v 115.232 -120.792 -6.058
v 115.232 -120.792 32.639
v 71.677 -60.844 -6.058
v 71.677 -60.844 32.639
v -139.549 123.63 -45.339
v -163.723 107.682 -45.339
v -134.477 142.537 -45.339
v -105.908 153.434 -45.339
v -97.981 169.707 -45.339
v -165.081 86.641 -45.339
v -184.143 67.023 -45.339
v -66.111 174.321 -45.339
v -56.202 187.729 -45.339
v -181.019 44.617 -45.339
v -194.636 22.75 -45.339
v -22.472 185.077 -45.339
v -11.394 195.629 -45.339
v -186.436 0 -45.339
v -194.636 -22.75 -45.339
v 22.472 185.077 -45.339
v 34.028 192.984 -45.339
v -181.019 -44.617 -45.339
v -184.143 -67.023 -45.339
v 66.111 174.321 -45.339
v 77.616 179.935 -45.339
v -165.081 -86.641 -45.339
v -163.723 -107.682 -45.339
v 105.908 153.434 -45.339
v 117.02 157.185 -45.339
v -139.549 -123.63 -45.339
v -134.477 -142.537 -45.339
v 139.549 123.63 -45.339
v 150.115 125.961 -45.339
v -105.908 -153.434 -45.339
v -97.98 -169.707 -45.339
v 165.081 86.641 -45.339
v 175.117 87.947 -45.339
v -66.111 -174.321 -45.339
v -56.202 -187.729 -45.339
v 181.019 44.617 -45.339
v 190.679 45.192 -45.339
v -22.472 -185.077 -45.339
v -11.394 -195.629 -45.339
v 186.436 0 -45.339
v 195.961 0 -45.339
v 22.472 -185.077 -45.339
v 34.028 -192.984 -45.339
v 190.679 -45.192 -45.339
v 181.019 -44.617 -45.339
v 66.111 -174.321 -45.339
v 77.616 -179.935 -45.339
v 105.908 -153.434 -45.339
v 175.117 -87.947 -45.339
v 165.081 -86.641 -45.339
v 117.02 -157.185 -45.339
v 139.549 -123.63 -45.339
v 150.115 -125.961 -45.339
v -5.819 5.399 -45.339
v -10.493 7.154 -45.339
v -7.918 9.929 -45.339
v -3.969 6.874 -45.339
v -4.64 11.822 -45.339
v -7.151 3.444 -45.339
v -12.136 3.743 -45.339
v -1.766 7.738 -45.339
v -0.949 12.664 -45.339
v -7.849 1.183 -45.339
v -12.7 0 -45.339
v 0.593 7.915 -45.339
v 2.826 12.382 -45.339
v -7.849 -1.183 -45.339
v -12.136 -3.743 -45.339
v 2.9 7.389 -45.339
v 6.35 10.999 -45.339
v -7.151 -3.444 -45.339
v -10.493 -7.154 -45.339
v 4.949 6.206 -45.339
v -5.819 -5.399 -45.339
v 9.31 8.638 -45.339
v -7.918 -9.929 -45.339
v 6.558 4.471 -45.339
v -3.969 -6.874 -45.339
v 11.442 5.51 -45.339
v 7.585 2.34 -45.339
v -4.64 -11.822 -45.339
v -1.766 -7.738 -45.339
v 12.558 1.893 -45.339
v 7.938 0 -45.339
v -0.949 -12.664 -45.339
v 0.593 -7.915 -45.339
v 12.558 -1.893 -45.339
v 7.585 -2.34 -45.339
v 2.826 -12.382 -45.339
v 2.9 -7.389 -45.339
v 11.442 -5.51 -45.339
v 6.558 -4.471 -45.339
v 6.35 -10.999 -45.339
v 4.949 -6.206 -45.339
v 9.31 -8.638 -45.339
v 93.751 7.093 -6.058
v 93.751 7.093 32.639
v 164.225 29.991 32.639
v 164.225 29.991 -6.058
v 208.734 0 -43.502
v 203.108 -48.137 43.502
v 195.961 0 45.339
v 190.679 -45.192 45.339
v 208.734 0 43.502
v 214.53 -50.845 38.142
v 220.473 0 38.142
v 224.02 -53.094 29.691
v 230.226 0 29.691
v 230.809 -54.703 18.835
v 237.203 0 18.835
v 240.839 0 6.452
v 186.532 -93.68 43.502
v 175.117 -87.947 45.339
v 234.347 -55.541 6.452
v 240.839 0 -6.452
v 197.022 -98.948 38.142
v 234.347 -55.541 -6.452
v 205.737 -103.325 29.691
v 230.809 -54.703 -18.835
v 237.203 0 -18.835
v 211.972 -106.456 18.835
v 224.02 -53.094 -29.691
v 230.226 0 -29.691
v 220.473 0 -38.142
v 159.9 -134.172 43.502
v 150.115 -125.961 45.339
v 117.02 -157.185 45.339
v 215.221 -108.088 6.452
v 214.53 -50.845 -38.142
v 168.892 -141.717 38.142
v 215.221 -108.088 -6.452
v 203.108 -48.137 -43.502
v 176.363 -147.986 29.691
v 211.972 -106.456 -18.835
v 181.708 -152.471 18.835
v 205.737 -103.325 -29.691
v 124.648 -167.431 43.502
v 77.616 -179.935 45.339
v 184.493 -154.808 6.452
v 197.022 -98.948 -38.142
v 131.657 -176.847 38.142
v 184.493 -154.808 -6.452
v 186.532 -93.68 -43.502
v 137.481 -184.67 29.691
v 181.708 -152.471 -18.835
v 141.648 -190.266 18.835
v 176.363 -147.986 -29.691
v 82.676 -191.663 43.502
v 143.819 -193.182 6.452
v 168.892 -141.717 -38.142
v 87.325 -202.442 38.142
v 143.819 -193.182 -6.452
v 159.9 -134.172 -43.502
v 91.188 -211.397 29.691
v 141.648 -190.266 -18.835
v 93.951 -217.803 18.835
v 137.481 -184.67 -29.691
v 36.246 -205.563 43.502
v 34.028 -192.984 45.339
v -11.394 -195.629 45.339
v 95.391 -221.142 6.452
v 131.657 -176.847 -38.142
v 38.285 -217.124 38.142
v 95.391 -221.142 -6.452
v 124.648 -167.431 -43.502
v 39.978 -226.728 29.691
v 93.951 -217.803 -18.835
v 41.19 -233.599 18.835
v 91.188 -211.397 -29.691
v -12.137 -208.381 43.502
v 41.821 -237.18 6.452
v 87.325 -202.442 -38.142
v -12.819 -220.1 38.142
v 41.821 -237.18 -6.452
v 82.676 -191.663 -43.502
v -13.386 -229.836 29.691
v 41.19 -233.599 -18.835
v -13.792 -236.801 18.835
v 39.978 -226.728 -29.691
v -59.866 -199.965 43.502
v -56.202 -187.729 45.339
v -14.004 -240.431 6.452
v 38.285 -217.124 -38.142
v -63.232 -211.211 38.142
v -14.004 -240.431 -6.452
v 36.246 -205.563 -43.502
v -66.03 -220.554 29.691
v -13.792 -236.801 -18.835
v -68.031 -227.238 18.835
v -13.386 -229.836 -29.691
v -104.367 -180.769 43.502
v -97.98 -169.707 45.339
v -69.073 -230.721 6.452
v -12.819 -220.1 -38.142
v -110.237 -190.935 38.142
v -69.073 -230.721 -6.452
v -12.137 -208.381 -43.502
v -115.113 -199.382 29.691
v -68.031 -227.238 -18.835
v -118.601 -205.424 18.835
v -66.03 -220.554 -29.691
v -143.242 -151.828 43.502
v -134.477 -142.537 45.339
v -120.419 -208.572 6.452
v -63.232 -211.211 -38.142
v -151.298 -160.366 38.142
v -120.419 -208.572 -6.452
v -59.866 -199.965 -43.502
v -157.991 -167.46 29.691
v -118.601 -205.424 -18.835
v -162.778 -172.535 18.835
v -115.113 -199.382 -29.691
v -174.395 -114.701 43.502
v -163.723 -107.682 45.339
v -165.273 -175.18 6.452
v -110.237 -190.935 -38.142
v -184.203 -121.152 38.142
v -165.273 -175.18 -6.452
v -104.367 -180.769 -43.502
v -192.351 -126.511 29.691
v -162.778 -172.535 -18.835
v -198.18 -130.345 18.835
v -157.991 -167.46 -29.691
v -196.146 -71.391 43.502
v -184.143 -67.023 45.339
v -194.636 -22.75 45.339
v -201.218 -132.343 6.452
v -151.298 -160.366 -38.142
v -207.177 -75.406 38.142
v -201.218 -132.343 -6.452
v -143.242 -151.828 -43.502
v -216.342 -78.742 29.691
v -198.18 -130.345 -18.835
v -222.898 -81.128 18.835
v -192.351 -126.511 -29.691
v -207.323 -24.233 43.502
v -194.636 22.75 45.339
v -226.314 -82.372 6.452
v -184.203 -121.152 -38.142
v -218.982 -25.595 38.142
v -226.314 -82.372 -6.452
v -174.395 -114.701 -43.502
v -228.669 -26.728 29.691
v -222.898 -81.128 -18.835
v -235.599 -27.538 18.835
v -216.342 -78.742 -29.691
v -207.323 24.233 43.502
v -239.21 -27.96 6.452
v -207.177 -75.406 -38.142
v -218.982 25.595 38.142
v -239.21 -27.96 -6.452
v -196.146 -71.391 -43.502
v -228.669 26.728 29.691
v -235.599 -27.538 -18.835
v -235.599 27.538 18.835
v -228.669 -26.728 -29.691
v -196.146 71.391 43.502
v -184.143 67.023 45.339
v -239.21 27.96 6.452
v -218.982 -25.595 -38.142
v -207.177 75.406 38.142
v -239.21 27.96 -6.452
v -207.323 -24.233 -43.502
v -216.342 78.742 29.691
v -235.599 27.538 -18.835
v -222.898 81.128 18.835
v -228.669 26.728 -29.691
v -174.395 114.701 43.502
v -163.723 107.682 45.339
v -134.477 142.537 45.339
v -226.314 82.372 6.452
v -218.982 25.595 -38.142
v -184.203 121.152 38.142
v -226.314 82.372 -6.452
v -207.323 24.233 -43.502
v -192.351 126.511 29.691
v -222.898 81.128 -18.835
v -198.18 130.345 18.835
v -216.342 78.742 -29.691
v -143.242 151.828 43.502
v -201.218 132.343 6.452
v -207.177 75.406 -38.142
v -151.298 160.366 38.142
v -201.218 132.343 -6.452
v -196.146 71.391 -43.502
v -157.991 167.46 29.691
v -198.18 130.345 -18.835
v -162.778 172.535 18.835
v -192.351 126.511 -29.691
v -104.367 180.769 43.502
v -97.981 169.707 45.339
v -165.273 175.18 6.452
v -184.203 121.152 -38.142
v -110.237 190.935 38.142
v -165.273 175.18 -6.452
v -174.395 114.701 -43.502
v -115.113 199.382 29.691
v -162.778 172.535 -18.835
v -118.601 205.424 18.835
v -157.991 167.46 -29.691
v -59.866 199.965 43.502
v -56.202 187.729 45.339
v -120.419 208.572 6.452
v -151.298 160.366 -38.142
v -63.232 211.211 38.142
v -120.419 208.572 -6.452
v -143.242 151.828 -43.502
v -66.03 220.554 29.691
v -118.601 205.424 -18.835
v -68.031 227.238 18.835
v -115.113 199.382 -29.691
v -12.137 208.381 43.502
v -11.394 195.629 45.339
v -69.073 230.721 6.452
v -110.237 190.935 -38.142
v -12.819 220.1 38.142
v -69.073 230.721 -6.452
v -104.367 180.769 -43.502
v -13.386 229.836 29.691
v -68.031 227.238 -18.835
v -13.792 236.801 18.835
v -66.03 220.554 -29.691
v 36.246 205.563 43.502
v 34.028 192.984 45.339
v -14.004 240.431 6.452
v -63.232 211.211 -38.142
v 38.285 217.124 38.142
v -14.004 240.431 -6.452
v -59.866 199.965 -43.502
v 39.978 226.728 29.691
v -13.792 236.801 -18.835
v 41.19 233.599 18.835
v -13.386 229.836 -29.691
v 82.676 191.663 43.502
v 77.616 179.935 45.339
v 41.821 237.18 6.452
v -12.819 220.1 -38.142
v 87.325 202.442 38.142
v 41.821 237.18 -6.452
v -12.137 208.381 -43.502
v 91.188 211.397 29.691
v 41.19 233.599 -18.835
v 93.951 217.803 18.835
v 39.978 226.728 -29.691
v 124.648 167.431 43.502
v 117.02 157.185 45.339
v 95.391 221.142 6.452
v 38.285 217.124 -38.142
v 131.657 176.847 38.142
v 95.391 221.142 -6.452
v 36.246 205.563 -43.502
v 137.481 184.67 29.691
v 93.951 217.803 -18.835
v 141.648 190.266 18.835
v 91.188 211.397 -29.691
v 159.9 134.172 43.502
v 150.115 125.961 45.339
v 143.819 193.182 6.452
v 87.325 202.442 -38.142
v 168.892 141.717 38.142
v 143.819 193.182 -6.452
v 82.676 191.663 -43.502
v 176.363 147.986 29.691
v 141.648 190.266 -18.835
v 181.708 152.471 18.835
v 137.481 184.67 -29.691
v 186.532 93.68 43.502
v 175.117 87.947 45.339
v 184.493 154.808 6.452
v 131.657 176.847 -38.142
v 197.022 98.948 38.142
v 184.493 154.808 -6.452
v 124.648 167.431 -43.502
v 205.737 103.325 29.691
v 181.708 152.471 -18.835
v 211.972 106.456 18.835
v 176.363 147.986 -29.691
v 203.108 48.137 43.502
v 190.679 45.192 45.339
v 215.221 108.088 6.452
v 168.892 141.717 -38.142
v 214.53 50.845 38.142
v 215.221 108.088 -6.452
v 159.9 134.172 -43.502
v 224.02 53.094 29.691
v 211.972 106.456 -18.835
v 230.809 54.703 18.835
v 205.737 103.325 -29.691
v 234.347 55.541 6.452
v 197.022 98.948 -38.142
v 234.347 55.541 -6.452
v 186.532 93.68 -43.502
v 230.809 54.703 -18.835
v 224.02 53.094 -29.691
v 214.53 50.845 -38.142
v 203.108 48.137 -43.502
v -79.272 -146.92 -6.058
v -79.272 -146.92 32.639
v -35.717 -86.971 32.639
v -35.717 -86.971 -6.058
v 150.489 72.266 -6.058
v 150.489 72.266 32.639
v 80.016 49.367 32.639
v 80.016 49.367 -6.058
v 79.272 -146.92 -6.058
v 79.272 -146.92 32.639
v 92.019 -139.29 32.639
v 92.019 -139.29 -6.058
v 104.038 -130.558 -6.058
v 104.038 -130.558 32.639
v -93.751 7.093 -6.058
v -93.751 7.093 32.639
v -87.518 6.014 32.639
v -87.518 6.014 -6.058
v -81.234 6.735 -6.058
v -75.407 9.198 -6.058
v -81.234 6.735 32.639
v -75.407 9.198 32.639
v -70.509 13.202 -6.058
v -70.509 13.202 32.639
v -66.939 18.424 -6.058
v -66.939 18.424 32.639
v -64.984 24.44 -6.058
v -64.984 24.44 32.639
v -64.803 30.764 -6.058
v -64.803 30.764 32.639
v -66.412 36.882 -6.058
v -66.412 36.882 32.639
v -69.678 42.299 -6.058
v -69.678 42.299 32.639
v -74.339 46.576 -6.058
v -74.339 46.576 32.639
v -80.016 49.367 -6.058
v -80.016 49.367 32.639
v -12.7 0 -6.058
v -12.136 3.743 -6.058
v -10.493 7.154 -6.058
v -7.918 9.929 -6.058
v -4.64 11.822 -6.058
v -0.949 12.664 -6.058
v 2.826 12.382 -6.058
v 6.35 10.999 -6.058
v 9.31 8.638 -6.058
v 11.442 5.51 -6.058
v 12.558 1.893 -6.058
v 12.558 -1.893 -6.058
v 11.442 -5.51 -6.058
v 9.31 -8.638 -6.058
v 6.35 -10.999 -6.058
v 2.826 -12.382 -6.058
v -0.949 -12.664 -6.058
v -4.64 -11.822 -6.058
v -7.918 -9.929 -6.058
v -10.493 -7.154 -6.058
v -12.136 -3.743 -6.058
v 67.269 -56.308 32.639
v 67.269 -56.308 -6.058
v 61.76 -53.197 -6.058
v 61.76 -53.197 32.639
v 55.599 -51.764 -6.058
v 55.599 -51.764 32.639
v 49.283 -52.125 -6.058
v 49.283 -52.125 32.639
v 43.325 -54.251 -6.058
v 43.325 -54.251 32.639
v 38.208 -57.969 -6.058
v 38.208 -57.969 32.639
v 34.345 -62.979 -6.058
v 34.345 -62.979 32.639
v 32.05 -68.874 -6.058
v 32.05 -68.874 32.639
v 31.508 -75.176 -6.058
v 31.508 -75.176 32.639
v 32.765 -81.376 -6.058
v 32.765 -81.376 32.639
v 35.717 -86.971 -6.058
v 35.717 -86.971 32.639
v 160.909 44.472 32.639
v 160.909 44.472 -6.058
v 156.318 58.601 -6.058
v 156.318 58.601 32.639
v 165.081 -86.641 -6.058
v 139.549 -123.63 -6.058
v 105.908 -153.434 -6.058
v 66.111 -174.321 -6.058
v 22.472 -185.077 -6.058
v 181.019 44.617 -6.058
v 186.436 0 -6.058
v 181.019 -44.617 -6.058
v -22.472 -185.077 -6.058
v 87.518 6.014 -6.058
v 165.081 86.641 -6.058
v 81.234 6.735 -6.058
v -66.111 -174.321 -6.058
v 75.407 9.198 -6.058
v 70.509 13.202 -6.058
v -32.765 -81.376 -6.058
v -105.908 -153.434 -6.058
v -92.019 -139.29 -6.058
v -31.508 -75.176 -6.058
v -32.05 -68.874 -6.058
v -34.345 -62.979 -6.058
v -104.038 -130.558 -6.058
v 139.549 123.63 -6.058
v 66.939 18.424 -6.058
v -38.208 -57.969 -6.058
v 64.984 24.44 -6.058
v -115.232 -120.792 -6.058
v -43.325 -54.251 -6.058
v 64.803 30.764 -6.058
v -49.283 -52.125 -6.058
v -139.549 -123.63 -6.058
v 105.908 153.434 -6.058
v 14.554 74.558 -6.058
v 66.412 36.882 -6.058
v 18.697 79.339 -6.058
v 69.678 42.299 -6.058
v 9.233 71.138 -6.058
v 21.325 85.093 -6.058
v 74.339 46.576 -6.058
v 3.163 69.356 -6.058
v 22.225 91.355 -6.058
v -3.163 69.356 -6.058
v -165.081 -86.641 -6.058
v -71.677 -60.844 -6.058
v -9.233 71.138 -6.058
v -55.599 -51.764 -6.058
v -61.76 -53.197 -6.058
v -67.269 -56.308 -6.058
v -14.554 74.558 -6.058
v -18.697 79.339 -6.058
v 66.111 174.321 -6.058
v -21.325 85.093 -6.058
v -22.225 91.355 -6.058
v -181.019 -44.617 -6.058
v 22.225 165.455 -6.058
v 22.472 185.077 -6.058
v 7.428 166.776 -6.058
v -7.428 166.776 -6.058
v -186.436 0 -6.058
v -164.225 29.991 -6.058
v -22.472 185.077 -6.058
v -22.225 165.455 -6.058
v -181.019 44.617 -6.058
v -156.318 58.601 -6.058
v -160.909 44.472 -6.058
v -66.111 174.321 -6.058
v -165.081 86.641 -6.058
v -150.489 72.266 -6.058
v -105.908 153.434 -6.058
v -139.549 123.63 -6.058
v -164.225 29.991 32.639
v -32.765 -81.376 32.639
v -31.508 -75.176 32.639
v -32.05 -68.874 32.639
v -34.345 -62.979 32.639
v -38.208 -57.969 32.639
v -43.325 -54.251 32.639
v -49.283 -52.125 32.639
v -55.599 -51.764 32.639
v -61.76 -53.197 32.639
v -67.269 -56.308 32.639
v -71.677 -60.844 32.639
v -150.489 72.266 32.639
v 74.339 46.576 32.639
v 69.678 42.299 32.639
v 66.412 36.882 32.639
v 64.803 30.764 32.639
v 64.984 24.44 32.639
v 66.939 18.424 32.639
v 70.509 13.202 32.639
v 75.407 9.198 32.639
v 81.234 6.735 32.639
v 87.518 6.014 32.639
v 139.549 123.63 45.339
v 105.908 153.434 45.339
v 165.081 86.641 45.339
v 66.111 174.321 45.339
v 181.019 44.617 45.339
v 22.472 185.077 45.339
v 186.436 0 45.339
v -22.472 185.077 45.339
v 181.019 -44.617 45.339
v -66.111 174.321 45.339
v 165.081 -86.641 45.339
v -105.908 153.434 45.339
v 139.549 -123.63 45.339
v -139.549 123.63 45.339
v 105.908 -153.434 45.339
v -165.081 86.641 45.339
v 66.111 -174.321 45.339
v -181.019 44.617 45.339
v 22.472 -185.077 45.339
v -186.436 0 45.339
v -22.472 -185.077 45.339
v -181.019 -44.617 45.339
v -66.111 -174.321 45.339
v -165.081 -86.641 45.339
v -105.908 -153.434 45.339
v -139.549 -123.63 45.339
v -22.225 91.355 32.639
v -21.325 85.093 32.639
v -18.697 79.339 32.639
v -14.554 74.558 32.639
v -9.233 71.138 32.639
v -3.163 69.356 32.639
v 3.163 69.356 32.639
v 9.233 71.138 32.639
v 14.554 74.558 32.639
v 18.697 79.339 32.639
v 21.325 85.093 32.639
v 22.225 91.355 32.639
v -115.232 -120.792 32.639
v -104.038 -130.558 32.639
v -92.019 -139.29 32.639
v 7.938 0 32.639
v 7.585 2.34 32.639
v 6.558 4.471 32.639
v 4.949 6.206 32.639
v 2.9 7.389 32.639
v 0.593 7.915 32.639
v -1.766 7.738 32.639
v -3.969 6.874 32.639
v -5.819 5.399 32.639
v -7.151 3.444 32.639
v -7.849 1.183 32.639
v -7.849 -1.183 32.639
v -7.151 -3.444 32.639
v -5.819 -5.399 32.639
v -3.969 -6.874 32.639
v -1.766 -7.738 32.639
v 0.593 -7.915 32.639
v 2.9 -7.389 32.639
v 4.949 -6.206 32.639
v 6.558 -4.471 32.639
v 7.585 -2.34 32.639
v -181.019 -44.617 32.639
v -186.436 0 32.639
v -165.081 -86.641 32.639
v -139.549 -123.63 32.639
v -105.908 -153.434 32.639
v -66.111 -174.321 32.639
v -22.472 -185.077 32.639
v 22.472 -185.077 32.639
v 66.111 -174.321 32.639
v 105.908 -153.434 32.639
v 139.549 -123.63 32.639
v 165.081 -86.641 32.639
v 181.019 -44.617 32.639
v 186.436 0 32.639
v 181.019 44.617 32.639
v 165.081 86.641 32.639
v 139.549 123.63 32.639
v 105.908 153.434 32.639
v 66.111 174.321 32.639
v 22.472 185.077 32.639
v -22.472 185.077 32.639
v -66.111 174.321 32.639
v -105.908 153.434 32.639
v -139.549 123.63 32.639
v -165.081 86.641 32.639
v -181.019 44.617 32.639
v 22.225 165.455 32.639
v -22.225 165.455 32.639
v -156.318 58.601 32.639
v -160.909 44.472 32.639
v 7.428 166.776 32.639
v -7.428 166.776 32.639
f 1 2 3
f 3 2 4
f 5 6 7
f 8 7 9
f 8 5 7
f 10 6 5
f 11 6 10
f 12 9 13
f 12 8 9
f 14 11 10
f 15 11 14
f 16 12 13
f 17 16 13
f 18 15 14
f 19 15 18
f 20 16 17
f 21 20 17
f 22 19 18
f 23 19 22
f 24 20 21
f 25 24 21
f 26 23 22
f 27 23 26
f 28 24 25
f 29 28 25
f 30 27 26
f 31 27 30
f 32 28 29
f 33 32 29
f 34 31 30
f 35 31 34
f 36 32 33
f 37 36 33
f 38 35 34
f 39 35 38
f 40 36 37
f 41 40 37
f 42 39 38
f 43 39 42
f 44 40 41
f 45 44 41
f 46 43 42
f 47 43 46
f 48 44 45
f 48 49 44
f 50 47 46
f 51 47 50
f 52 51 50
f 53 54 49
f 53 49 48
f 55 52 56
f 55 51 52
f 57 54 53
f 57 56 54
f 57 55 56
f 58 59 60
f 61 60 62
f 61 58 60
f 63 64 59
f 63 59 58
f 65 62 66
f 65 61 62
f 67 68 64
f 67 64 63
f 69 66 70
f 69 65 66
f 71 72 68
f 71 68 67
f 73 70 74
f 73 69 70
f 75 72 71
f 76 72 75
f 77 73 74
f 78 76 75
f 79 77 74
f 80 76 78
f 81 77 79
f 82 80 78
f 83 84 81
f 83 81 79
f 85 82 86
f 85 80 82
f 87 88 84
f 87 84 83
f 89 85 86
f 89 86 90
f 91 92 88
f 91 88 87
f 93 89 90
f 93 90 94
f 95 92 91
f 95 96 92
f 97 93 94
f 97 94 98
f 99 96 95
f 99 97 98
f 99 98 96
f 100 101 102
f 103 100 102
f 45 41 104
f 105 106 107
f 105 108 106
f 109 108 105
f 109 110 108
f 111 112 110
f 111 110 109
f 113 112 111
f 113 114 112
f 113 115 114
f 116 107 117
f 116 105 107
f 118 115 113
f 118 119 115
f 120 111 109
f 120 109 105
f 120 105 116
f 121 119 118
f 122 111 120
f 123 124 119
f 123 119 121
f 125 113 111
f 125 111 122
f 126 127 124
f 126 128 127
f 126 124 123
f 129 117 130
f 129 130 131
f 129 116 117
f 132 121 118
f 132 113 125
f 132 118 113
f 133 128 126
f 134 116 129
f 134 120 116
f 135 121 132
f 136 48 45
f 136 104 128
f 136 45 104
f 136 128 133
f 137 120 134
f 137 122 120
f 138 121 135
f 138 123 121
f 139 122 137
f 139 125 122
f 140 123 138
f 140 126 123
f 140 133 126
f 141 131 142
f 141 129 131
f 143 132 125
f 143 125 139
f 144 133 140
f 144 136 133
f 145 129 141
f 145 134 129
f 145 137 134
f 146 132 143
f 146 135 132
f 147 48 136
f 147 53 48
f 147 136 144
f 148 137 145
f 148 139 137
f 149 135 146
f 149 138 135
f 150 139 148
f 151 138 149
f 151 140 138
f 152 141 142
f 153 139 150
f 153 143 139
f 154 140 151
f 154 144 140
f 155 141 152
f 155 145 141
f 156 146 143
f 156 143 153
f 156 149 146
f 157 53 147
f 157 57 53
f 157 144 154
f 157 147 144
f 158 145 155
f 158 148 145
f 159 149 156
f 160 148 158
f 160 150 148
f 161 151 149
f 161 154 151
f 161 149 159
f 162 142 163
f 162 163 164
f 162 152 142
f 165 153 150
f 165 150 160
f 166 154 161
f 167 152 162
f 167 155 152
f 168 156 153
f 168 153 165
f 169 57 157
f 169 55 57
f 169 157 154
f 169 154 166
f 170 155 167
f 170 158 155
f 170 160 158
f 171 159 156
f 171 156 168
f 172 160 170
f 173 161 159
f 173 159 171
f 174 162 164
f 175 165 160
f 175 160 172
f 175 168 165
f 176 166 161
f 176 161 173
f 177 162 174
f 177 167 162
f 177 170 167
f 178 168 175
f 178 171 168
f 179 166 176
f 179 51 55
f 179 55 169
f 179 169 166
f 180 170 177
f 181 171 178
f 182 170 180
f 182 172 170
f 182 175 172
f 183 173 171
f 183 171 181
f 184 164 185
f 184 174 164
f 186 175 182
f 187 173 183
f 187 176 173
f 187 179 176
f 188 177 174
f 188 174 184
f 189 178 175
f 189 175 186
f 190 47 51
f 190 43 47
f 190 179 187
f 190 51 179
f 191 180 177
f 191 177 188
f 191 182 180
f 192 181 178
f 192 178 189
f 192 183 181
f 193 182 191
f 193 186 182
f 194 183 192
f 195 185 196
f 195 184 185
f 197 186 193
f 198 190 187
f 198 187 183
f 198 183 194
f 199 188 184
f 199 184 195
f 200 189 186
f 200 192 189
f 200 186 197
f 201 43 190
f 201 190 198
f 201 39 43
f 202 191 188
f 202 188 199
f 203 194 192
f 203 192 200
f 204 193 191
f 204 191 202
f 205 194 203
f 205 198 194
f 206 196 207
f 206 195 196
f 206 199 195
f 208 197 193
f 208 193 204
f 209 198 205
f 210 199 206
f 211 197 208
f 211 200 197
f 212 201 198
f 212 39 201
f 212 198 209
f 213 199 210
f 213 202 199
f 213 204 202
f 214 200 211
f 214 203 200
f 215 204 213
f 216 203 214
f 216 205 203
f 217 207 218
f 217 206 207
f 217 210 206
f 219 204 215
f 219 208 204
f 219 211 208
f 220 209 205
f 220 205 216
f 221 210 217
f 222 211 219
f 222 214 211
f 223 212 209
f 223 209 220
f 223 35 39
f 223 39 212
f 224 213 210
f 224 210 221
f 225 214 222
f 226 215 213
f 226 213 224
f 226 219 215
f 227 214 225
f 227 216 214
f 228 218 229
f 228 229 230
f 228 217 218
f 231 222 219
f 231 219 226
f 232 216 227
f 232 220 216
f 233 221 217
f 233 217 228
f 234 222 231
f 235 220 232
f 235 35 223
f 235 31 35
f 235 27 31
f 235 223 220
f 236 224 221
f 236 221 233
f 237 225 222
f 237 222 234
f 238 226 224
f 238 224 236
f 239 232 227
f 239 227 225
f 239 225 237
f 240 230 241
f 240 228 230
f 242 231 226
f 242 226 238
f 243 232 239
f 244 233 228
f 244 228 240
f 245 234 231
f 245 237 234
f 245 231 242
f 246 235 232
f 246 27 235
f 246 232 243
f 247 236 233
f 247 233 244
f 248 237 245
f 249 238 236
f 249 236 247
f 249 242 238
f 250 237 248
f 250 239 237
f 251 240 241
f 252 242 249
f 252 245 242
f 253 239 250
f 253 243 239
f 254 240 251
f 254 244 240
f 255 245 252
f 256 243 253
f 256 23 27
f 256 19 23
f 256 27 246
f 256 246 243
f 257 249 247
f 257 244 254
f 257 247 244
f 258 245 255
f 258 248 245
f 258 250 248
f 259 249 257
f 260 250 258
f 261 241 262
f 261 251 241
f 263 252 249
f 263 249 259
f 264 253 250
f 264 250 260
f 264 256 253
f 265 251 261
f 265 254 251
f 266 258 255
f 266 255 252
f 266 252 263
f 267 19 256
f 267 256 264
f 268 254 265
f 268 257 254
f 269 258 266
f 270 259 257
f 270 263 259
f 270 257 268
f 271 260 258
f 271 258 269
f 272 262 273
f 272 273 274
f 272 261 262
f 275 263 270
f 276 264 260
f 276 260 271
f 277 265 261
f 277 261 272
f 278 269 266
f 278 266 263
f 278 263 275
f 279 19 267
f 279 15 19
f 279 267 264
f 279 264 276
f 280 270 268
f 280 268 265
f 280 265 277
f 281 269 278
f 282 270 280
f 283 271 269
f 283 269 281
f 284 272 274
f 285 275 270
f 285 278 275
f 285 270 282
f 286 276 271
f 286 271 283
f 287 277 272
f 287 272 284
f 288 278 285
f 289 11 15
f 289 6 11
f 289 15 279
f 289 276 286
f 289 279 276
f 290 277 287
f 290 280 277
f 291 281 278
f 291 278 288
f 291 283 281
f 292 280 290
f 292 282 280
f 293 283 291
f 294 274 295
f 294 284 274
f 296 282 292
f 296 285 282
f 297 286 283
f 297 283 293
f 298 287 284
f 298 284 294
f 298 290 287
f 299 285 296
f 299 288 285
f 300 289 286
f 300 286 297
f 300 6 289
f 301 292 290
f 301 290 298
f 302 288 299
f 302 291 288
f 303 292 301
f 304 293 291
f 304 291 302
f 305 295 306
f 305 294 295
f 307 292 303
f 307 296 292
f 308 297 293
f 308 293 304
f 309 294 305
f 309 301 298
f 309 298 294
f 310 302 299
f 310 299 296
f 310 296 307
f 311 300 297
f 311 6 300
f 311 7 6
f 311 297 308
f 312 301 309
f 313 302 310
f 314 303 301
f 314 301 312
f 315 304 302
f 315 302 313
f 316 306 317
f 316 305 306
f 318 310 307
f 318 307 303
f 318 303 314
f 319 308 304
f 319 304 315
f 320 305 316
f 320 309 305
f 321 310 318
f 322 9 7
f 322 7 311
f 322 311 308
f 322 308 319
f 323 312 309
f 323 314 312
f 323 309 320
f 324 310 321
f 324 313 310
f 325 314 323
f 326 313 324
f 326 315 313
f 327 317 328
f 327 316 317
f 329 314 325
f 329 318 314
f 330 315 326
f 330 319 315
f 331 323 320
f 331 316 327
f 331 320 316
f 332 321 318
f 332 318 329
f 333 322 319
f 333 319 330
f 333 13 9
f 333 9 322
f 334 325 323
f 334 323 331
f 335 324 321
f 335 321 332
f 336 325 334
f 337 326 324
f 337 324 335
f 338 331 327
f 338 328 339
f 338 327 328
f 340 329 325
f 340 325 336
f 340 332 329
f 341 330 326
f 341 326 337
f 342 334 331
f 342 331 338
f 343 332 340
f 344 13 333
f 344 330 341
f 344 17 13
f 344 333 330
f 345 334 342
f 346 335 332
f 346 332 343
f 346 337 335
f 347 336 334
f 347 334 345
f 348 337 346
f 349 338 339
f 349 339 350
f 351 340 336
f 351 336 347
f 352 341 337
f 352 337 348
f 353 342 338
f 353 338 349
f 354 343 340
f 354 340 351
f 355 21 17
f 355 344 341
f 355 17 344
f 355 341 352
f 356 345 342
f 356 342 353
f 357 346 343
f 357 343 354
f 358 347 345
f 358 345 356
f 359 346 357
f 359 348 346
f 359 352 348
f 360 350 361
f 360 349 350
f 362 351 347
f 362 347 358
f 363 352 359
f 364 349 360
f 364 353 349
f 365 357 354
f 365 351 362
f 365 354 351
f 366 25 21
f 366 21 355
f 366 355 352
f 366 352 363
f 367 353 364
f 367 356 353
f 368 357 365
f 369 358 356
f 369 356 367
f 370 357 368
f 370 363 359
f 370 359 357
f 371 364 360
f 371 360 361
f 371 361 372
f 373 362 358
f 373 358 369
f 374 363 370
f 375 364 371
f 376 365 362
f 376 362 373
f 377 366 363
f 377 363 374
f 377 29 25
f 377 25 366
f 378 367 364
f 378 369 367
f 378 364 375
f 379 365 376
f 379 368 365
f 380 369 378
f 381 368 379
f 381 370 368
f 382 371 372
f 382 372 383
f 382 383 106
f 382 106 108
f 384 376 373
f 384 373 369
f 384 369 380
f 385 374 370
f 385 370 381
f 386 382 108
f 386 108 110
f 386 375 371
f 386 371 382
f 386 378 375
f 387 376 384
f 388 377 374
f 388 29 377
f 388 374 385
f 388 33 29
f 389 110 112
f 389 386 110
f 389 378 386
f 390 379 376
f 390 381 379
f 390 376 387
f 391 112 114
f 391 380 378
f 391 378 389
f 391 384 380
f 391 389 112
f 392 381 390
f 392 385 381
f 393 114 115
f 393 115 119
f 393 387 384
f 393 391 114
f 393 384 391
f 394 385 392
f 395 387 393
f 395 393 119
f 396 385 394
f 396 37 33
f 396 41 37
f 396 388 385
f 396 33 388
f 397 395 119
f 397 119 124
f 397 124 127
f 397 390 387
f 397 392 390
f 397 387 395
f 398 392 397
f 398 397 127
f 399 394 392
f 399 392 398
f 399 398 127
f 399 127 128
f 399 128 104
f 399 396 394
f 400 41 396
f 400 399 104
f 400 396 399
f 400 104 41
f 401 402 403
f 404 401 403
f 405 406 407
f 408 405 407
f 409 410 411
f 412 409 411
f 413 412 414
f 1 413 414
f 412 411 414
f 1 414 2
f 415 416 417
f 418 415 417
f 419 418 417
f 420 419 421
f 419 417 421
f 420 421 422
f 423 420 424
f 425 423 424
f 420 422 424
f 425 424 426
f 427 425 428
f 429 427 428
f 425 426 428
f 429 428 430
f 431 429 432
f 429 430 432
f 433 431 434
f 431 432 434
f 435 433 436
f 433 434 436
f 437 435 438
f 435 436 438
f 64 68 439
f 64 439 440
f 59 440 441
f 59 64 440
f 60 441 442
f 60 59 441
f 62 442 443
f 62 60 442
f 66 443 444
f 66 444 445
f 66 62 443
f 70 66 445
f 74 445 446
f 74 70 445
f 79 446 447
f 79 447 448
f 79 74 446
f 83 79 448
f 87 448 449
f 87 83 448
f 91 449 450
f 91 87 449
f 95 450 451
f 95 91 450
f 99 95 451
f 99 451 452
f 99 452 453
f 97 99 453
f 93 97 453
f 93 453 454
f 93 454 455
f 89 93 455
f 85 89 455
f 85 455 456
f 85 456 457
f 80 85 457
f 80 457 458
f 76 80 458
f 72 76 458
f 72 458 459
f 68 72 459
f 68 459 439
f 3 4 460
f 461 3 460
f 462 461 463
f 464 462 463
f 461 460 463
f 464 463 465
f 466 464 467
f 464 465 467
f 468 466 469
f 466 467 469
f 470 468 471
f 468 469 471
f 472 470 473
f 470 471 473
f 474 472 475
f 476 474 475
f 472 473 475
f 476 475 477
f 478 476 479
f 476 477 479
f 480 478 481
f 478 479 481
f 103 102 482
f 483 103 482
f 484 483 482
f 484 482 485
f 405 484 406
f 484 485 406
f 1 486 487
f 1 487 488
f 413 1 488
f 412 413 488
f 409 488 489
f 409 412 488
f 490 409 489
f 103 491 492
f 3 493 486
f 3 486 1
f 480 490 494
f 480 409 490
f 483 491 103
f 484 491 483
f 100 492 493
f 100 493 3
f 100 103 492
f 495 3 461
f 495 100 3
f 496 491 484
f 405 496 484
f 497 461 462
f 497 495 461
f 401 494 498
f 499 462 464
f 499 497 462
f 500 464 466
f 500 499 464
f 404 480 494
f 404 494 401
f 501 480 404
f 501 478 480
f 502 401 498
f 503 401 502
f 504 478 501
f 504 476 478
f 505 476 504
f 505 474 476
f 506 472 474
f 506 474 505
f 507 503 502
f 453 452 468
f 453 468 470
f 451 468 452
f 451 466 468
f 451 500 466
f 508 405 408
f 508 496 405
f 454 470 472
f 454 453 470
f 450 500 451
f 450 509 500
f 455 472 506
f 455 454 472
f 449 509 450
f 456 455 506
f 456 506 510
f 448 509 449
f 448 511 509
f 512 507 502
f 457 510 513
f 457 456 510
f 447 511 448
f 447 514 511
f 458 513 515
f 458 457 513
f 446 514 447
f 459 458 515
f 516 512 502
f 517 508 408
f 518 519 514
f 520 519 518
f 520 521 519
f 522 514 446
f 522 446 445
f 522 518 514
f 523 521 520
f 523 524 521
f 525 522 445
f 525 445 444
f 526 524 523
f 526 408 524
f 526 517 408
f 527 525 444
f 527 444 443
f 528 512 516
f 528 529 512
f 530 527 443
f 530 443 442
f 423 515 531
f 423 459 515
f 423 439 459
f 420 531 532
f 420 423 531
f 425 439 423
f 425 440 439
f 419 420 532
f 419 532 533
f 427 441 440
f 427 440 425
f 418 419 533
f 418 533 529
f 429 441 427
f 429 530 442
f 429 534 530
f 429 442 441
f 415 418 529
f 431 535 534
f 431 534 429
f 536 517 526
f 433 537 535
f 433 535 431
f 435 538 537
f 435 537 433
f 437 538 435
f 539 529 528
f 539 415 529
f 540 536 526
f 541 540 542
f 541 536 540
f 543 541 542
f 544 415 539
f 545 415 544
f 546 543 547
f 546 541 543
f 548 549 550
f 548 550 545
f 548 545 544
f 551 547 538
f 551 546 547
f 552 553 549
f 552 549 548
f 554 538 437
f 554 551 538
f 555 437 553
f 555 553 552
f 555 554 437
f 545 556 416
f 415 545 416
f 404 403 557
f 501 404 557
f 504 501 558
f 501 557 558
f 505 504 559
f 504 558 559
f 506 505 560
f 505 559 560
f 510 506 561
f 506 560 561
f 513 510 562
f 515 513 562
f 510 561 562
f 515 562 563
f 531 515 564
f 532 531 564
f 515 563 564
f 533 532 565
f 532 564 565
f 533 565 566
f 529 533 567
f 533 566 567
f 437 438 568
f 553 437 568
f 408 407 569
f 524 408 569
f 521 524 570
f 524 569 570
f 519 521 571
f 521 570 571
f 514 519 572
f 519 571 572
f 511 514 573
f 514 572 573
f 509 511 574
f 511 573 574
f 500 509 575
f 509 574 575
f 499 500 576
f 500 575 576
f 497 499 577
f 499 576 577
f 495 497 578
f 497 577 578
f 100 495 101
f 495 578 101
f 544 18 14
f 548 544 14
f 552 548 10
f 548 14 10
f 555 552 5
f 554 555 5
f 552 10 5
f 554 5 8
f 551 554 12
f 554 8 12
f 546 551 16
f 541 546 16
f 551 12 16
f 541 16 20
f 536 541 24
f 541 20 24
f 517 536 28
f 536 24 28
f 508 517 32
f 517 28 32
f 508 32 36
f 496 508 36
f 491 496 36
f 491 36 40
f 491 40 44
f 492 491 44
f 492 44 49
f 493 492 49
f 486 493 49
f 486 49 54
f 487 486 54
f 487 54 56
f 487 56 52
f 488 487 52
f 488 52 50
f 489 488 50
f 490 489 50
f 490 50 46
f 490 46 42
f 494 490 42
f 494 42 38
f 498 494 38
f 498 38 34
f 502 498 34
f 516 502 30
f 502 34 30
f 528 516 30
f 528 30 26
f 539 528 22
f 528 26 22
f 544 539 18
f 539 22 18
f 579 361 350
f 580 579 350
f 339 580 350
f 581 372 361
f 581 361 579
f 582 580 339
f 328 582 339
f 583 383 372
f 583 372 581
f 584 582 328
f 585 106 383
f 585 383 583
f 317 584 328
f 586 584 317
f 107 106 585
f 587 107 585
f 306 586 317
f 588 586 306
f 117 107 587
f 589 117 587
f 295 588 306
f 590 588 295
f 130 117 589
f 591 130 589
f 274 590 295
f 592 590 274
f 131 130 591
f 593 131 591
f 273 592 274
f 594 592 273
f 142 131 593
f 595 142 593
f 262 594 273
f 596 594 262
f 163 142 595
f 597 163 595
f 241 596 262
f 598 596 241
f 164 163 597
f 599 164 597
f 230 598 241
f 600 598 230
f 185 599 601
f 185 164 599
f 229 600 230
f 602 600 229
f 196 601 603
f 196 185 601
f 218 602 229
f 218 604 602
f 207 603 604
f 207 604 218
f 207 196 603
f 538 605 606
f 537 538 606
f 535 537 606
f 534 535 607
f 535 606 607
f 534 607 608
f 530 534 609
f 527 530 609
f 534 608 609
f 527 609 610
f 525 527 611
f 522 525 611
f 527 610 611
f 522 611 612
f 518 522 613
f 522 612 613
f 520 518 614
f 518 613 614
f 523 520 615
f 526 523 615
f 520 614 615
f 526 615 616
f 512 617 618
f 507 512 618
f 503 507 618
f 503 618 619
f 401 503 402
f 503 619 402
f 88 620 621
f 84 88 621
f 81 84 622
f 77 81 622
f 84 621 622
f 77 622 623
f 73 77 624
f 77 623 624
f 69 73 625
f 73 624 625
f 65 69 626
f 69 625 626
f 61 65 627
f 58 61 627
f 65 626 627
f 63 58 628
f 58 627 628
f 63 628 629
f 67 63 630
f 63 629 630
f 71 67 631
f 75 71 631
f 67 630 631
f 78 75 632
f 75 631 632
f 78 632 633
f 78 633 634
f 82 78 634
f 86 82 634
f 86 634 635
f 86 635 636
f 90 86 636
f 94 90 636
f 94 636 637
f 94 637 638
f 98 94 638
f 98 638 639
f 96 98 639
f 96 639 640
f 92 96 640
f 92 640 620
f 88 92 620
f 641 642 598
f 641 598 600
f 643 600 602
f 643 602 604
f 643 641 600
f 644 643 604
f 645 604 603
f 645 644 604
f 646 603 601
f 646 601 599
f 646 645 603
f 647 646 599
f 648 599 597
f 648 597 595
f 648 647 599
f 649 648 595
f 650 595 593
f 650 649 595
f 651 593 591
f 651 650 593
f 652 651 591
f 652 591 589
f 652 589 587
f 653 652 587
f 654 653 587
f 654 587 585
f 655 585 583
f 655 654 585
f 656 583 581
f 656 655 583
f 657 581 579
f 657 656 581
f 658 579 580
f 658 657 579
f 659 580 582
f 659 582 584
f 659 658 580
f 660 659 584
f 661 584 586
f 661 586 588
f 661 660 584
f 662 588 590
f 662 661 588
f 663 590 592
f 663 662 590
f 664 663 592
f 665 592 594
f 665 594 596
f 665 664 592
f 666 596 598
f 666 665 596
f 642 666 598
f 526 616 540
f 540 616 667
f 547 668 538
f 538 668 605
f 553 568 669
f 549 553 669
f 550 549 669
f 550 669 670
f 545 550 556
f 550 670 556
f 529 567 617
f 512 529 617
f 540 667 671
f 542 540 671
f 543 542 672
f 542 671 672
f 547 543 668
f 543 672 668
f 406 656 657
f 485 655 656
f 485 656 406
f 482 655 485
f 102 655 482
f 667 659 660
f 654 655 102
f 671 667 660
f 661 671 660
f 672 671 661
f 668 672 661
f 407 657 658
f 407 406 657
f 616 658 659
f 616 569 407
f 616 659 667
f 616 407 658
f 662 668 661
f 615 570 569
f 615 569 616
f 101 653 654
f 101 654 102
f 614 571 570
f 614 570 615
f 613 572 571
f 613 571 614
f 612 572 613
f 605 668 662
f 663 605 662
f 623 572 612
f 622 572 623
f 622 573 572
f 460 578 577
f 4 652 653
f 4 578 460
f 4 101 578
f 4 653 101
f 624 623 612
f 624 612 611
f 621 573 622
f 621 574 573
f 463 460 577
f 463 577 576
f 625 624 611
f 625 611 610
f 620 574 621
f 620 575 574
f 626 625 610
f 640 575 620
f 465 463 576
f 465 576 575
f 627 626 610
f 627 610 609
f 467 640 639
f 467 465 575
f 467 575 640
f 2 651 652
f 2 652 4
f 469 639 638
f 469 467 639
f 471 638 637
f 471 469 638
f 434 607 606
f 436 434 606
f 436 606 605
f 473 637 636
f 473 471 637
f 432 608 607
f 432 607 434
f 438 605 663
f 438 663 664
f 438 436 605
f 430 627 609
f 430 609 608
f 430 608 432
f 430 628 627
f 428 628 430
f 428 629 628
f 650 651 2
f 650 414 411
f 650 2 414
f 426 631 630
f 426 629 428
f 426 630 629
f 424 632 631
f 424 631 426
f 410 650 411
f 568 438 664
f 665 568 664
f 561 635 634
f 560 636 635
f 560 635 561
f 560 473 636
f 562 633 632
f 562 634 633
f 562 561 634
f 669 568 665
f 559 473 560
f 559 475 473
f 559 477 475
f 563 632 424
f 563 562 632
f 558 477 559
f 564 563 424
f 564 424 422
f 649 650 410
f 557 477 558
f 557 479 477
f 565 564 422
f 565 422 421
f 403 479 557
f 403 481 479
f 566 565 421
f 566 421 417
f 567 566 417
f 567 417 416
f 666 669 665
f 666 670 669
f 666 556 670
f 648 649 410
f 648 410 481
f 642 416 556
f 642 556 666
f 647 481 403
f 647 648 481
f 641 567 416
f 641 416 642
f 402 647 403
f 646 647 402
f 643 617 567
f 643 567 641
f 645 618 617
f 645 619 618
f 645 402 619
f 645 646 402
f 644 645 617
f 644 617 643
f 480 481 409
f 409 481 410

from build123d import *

# Parameters (mm, degrees)
SKETCH2_R      = 7.9375
EXTRUDE1_DEPTH = 354.091885747
SKETCH3_R      = 186.436
SKETCH3_R_2    = 12.7
EXTRUDE2_DEPTH = 12.2936
SKETCH4_R      = 186.436
SKETCH4_R_2    = 12.7
EXTRUDE4_DEPTH = 26.9875
EXTRUDE5_START = -12.7
SKETCH5_R      = 186.436
EXTRUDE5_DEPTH = 12.7
EXTRUDE6_DEPTH = 351.045637854


with BuildPart() as part:
    # Sketch1 → Revolve1 (revolve)
    with BuildSketch(Plane(origin=(0, 0, 0), x_dir=(0, 0, -1), z_dir=(1, 0, 0)), mode=Mode.PRIVATE) as revolve1_sk:
        with BuildLine():
            Line((45.339, 0), (-45.339, 0))
            Line((-45.339, 0), (-45.339, 195.961))
            ThreePointArc((-45.339, 195.961), (0, 241.3), (45.339, 195.961))
            Line((45.339, 195.961), (45.339, 0))
        make_face()
    revolve(revolve1_sk.sketch.rotate(Axis((0, 0, 45.339), (0, 0, -1)), 90), axis=Axis((0, 0, 45.339), (0, 0, -1)))

    # Sketch2 → Extrude1 (cut, through all)
    with BuildSketch(Plane.XY.offset(45.339)):
        Circle(SKETCH2_R)
    extrude(amount=-EXTRUDE1_DEPTH, mode=Mode.SUBTRACT)

    # Sketch3 → Extrude2 (cut)
    with BuildSketch(Plane(origin=(0, 0, -45.339), x_dir=(-1, 0, 0), z_dir=(0, 0, -1))):
        Circle(SKETCH3_R)
        Circle(SKETCH3_R_2, mode=Mode.SUBTRACT)
    extrude(amount=-EXTRUDE2_DEPTH, mode=Mode.SUBTRACT)

    # Sketch4 → Extrude4 (cut)
    with BuildSketch(Plane(origin=(0, 0, -33.0454), x_dir=(-1, 0, 0), z_dir=(0, 0, -1))):
        Circle(SKETCH4_R)
        Circle(SKETCH4_R_2, mode=Mode.SUBTRACT)
    extrude(amount=-EXTRUDE4_DEPTH, mode=Mode.SUBTRACT)

    # Sketch5 → Extrude5 (cut)
    with BuildSketch(Plane.XY.offset(45.339).offset(EXTRUDE5_START)):
        with Locations(Location((0, 0, 0), (0, 0, 180))):
            Circle(SKETCH5_R)
    extrude(amount=EXTRUDE5_DEPTH, mode=Mode.SUBTRACT)

    # Sketch6 → Extrude6 (cut, through all)
    with BuildSketch(Plane.XY.offset(32.639)):
        with BuildLine():
            Line((150.489255243, 72.265671034), (80.015659908, 49.367411845))
            ThreePointArc((80.015659908, 49.367411845), (65.746331533, 21.36227807), (93.751465308, 7.092949695))
            Line((93.751465308, 7.092949695), (164.225060643, 29.991208884))
            ThreePointArc((164.225060643, 29.991208884), (158.770455984, 51.587648329), (150.489255243, 72.265671034))
        make_face()
        with BuildLine():
            Line((-22.225, 165.455107291), (-22.225, 91.354783989))
            ThreePointArc((-22.225, 91.354783989), (0, 69.129783989), (22.225, 91.354783989))
            Line((22.225, 91.354783989), (22.225, 165.455107291))
            ThreePointArc((22.225, 165.455107291), (0, 166.941136793), (-22.225, 165.455107291))
        make_face()
        with BuildLine():
            Line((115.232474682, -120.792466372), (71.677397455, -60.844045532))
            ThreePointArc((71.677397455, -60.844045532), (40.633467523, -55.927170065), (35.716592055, -86.971099997))
            Line((35.716592055, -86.971099997), (79.271669282, -146.919520837))
            ThreePointArc((79.271669282, -146.919520837), (98.125538208, -135.058216725), (115.232474682, -120.792466372))
        make_face()
        with BuildLine():
            Line((-79.271669282, -146.919520837), (-35.716592055, -86.971099997))
            ThreePointArc((-35.716592055, -86.971099997), (-40.633467523, -55.927170065), (-71.677397455, -60.844045532))
            Line((-71.677397455, -60.844045532), (-115.232474682, -120.792466372))
            ThreePointArc((-115.232474682, -120.792466372), (-98.125538208, -135.058216725), (-79.271669282, -146.919520837))
        make_face()
        with BuildLine():
            Line((-164.225060643, 29.991208884), (-93.751465308, 7.092949695))
            ThreePointArc((-93.751465308, 7.092949695), (-65.746331533, 21.36227807), (-80.015659908, 49.367411845))
            Line((-80.015659908, 49.367411845), (-150.489255243, 72.265671034))
            ThreePointArc((-150.489255243, 72.265671034), (-158.770455984, 51.587648329), (-164.225060643, 29.991208884))
        make_face()
    extrude(amount=-EXTRUDE6_DEPTH, mode=Mode.SUBTRACT)


solid = part.part
